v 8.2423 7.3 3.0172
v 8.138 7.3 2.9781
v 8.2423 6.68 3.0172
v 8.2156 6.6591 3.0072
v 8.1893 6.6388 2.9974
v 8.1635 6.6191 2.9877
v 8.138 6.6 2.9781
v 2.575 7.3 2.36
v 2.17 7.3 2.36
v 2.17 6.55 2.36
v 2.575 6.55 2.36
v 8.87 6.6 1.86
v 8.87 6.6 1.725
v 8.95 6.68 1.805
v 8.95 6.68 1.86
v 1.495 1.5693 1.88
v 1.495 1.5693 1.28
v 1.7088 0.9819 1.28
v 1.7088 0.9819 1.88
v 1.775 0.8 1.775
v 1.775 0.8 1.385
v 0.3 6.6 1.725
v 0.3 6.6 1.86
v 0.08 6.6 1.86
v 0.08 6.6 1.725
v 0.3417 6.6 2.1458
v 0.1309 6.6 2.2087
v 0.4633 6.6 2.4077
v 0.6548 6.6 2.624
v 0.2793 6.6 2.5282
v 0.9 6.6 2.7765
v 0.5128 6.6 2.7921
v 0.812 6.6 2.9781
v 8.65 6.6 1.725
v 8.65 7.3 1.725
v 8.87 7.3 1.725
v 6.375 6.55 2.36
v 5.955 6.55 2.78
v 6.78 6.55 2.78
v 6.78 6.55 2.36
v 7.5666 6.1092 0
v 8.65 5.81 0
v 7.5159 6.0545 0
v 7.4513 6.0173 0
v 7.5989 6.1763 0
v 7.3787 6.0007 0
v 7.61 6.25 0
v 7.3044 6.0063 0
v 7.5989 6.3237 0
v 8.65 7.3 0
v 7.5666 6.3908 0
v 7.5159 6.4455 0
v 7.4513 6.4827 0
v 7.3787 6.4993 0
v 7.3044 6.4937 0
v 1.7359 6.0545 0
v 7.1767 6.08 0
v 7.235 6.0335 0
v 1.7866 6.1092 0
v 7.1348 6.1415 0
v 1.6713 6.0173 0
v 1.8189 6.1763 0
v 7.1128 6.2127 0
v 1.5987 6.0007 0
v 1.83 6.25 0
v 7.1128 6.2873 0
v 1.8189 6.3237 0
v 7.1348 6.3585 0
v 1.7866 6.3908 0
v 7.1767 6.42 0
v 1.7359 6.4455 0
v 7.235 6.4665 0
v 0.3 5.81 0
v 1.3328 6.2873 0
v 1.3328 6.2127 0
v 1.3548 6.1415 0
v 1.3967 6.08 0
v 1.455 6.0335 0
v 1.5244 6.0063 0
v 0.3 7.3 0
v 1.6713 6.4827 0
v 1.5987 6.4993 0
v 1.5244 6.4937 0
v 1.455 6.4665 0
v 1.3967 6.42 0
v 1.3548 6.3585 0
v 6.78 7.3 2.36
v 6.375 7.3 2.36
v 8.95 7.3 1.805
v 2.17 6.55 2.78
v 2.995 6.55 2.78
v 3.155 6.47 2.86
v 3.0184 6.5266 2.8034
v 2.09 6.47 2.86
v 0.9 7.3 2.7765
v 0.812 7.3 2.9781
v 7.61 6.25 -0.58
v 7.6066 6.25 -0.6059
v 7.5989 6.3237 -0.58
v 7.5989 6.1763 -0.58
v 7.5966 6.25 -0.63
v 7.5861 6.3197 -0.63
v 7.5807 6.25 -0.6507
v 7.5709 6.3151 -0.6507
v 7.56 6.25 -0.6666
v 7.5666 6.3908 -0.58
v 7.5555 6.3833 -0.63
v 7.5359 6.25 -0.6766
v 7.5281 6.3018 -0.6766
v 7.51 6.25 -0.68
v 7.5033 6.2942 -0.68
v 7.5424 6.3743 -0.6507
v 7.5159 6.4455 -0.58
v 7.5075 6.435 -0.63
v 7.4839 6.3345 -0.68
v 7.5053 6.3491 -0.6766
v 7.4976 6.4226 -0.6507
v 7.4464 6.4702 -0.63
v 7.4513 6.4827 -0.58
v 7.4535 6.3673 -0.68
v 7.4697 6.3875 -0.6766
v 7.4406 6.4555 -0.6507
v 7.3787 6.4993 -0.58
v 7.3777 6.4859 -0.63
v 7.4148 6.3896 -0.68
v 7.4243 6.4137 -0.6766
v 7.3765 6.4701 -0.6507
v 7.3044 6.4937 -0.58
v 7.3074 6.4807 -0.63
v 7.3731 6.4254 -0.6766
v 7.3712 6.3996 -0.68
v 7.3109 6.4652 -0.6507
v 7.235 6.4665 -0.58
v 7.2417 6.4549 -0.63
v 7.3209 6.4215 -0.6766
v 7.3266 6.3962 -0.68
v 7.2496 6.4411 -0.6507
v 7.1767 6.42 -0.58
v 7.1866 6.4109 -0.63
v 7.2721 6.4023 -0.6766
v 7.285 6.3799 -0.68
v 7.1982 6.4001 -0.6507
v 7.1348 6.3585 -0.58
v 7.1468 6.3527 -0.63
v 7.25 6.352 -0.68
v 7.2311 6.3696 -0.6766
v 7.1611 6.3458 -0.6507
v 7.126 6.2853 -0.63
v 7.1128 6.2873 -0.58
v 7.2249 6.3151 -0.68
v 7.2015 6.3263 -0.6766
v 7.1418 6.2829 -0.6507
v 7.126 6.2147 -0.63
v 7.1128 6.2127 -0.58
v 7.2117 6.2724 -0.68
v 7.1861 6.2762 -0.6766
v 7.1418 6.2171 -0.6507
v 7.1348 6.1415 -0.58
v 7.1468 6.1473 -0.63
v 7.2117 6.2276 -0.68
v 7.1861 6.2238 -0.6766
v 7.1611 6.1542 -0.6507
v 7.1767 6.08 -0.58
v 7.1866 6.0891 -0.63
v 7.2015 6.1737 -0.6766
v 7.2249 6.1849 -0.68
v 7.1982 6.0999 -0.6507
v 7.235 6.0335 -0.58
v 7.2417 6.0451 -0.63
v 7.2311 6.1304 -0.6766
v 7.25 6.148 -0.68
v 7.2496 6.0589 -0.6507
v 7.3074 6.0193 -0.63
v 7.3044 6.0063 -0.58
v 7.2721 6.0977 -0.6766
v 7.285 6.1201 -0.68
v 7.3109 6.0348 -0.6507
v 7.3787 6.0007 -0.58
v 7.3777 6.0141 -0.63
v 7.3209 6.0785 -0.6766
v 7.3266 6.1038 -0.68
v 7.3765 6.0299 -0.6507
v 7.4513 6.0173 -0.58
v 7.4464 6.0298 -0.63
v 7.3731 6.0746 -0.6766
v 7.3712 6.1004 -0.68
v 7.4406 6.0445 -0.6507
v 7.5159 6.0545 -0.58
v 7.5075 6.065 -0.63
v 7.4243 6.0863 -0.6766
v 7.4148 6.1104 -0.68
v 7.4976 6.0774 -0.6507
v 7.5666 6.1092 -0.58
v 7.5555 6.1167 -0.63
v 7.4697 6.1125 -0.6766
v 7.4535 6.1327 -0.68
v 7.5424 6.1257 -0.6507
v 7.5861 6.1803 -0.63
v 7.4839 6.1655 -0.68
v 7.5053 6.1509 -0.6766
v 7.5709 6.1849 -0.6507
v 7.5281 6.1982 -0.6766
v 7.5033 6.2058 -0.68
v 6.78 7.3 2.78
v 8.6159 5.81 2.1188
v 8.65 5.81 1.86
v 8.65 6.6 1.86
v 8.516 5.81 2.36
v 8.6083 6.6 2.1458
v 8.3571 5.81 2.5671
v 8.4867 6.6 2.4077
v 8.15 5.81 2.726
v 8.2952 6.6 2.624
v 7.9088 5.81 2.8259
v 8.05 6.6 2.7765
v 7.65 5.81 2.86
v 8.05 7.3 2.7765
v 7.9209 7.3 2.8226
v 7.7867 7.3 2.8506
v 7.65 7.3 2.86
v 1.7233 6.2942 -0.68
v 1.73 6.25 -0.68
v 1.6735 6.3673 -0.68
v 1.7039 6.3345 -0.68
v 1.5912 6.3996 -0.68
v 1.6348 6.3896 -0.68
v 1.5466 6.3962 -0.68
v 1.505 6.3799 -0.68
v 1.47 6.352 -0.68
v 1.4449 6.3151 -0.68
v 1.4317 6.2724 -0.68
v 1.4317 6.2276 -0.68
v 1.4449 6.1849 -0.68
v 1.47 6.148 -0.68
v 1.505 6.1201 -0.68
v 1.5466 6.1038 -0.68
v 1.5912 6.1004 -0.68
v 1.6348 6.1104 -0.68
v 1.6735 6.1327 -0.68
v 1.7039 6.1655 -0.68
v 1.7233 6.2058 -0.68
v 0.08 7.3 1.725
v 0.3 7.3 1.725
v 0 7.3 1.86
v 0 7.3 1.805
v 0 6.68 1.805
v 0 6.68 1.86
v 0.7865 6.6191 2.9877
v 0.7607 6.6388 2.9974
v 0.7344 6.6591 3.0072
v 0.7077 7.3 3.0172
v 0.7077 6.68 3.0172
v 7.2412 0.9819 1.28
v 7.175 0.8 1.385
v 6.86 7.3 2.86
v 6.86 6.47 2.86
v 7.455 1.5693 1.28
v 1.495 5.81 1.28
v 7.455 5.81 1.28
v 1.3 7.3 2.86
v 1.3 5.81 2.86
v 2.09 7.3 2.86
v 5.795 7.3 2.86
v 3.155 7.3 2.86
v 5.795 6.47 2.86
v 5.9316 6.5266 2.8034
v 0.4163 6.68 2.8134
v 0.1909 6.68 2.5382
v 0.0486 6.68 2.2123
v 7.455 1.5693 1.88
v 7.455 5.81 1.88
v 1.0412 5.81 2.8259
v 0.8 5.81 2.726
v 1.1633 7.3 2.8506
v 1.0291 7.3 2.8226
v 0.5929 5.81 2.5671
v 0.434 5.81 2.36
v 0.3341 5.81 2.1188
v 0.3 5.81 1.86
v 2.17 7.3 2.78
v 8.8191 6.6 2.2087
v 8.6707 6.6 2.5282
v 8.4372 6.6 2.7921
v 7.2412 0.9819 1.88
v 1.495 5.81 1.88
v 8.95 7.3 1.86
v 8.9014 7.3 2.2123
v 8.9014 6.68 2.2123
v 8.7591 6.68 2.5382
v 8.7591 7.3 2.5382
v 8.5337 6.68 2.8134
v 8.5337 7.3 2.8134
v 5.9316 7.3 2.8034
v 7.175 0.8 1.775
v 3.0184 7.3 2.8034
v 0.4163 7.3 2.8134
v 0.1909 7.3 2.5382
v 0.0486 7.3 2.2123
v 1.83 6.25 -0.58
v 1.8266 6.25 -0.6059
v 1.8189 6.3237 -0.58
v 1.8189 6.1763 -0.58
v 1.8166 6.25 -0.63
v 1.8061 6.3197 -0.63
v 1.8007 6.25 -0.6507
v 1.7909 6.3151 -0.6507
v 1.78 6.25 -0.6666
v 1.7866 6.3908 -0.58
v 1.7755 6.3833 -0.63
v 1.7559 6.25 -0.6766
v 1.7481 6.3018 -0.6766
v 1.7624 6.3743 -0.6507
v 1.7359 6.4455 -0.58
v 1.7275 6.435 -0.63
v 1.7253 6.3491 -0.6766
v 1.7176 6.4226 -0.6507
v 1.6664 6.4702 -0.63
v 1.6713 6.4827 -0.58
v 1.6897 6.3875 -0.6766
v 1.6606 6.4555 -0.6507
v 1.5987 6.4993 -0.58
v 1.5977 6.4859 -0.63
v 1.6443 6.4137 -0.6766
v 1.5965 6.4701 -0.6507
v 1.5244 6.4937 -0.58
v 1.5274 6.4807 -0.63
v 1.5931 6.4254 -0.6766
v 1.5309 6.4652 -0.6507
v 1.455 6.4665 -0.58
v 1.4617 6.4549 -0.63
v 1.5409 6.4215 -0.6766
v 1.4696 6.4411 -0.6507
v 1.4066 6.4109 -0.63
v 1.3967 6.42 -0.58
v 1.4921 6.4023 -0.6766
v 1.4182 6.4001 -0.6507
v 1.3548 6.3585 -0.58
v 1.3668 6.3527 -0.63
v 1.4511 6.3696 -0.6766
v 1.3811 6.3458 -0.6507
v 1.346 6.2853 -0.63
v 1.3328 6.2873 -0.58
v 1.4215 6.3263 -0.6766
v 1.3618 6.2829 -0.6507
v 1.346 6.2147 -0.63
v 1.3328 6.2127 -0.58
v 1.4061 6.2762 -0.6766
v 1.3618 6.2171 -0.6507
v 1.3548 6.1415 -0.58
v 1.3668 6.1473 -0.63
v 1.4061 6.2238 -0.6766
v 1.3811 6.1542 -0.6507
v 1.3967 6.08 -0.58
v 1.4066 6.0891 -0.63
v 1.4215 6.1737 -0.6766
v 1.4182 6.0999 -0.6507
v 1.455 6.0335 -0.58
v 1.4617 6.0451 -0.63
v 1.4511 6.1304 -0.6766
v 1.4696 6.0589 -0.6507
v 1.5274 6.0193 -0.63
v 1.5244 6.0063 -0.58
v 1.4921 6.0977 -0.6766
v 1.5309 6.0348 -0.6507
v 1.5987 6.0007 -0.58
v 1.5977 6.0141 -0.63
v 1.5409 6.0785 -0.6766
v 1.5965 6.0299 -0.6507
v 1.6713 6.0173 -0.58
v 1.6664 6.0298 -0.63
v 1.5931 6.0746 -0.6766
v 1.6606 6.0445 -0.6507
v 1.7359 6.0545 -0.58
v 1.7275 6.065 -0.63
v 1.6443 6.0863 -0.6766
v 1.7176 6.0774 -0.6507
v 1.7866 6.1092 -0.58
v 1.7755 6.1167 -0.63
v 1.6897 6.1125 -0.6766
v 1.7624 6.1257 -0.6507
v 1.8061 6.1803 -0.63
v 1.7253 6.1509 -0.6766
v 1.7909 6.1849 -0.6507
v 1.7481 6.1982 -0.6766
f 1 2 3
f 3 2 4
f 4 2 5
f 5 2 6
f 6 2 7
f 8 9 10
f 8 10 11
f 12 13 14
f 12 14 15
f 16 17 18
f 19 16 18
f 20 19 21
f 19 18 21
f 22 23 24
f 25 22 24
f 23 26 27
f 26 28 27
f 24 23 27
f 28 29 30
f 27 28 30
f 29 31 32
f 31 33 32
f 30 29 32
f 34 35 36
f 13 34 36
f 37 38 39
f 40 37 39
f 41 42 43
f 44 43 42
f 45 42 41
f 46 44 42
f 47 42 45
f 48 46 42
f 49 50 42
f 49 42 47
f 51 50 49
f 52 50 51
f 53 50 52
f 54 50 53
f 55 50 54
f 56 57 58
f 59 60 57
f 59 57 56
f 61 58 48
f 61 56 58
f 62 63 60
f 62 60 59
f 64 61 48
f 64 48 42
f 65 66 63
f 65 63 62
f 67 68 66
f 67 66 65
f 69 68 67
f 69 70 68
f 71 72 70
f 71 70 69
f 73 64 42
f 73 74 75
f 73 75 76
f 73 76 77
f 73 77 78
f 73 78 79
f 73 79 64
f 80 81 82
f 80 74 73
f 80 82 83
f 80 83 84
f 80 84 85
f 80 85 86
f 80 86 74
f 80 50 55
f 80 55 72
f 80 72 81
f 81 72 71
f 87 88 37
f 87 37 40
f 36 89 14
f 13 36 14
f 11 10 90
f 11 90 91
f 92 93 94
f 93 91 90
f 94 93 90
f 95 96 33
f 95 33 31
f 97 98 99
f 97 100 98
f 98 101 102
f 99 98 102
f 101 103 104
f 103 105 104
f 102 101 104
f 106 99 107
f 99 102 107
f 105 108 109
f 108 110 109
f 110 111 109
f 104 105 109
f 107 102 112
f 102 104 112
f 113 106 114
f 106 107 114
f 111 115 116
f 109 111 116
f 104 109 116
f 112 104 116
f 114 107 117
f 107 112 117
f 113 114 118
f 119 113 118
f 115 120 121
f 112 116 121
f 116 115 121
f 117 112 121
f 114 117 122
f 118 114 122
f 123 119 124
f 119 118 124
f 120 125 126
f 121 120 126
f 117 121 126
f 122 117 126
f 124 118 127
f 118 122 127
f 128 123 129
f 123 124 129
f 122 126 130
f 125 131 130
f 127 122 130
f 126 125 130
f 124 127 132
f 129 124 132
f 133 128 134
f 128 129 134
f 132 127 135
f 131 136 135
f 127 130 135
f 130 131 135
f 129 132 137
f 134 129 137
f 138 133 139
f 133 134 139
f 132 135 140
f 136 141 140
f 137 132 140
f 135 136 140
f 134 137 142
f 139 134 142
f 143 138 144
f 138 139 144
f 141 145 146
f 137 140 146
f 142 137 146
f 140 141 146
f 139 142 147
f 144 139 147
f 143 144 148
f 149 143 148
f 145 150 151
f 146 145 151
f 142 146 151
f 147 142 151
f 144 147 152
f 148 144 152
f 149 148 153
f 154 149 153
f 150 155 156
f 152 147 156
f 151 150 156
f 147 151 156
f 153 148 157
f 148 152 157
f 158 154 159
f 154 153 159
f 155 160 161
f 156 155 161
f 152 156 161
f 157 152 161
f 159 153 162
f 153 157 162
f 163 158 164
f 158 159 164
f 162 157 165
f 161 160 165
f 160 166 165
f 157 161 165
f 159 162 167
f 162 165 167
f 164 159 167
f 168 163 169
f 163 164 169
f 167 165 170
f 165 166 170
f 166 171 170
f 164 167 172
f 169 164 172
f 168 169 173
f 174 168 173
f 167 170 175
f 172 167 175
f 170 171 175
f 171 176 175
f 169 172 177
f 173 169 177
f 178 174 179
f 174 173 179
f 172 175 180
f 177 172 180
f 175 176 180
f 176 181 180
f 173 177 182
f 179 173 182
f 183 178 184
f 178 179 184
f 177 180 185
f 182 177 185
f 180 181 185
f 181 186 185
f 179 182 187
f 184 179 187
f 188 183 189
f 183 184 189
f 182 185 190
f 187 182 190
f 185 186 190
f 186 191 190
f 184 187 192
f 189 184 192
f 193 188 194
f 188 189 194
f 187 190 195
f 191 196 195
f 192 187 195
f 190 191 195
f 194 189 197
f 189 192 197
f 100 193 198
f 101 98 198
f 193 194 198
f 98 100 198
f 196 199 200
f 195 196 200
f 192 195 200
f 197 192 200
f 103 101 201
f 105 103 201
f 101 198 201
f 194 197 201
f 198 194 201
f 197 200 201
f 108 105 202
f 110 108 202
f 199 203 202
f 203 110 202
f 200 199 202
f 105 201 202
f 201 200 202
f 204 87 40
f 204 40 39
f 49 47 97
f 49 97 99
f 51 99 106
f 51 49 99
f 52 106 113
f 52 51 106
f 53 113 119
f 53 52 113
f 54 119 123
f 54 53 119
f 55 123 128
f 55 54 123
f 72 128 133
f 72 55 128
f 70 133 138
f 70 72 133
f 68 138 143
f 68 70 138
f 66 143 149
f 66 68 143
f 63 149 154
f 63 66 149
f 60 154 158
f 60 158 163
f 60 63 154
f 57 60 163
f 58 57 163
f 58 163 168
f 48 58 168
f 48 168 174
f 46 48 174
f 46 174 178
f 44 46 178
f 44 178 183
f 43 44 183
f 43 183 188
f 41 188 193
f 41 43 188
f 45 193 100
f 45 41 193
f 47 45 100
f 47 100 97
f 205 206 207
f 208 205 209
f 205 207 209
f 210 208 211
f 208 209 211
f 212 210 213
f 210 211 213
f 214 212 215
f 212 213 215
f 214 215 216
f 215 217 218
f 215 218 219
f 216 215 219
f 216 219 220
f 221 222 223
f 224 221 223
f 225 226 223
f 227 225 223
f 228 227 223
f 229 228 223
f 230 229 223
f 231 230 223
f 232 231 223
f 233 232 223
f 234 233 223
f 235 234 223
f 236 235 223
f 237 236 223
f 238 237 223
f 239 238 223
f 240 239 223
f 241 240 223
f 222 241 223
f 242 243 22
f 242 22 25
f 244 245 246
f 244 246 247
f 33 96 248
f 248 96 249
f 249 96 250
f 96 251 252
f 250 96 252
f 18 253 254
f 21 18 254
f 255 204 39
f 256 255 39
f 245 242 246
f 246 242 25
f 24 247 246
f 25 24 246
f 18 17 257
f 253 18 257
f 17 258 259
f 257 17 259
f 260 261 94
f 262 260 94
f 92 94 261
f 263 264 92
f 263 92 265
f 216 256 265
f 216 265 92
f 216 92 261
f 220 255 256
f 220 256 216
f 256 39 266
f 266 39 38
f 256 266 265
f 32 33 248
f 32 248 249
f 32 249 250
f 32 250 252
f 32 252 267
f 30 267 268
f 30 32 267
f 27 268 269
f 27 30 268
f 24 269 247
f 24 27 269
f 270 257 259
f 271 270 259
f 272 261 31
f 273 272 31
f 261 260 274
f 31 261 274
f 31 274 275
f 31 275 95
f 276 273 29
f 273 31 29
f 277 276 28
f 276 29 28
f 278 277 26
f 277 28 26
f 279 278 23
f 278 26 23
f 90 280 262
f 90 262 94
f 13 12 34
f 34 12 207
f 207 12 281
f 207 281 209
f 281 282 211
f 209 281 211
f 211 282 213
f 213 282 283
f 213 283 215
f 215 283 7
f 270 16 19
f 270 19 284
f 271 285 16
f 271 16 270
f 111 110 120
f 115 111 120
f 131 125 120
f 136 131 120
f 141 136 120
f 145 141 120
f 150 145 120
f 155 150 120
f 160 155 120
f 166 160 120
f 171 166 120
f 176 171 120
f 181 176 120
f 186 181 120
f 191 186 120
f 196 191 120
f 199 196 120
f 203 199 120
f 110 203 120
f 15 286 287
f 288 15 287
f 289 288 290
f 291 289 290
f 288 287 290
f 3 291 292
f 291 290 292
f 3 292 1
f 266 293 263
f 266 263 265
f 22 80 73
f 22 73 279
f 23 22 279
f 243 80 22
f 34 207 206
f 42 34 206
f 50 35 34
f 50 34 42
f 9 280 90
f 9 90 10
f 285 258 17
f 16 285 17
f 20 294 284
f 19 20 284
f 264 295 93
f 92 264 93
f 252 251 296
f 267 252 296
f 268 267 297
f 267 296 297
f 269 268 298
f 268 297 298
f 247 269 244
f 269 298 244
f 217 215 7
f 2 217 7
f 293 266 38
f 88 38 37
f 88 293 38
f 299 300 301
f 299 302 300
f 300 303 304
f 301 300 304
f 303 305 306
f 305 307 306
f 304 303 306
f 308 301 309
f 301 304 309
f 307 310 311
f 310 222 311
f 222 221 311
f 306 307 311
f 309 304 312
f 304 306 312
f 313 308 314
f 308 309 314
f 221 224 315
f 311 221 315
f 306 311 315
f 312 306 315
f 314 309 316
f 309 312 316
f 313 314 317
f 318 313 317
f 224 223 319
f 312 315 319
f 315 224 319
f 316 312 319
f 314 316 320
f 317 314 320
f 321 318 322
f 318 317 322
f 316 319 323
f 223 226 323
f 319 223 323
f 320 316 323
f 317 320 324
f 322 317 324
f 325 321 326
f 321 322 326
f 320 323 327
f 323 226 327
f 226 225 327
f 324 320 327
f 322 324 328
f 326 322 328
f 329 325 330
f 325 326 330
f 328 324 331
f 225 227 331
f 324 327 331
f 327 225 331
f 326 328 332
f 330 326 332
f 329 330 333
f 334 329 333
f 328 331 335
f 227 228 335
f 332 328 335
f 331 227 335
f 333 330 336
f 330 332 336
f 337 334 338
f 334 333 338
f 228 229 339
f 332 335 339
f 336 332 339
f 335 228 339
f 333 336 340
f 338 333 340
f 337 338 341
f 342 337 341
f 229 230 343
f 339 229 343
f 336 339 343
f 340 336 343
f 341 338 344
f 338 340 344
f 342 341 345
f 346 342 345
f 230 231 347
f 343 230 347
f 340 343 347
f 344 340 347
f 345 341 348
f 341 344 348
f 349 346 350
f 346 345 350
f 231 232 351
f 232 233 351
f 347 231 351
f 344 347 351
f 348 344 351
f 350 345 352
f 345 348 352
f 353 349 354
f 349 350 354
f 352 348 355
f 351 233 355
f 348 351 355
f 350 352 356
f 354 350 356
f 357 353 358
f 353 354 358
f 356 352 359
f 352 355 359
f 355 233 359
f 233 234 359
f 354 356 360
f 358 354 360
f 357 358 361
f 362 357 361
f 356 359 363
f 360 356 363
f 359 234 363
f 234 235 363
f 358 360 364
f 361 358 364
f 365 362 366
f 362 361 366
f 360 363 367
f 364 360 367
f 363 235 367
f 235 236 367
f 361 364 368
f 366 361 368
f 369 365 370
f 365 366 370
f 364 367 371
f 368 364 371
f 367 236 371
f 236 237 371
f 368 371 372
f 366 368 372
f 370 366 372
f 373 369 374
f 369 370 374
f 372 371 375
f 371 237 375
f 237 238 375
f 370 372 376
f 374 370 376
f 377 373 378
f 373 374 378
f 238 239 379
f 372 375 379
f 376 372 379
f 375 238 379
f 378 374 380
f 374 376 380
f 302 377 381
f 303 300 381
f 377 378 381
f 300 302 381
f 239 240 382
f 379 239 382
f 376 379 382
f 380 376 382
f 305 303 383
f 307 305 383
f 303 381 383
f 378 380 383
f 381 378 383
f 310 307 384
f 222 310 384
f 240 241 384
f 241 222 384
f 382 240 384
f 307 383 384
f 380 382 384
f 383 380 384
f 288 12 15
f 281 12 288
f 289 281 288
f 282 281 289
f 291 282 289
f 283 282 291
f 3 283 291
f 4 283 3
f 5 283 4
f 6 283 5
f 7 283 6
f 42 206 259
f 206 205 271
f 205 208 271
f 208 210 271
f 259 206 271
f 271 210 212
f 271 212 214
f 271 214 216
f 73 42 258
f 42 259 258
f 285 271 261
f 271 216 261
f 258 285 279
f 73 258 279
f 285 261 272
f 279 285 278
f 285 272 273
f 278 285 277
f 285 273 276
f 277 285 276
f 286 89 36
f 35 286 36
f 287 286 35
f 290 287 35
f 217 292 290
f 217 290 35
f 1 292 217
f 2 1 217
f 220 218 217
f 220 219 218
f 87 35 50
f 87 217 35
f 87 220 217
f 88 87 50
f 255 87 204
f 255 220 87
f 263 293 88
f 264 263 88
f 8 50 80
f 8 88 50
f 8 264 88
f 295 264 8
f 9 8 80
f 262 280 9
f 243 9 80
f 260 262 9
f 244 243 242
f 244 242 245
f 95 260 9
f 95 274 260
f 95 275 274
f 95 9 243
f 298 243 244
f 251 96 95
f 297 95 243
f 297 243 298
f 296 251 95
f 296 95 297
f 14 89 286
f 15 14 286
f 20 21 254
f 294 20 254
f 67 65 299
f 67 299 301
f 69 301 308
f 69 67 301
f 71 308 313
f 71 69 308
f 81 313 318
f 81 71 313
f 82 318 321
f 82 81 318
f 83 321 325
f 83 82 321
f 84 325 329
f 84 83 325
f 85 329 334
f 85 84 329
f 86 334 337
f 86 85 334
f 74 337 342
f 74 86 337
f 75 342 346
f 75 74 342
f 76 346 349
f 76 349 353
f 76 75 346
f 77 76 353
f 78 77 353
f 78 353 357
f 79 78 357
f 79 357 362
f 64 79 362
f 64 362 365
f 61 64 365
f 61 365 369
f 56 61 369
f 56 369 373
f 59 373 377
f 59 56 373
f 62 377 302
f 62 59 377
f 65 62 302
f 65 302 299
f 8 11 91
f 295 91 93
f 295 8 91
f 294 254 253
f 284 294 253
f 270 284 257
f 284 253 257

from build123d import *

# Parameters (mm, degrees)
PAD003_DEPTH    = 1.49
PAD004_DEPTH    = 0.7
POCKET003_DEPTH = 0.75
CHAMFER_SIZE    = 0.08
PAD006_DEPTH    = 0.6
POCKET004_DEPTH = 7.456
SKETCH014_R     = 0.25
PAD007_DEPTH    = 0.68
FILLET002_R     = 0.1


with BuildPart() as part:
    # Sketch006 → Pad003 (new body)
    with BuildSketch(Plane.XZ.offset(-7.3)):
        with BuildLine():
            Line((0.3, 0), (0.3, 1.86))
            ThreePointArc((1.3, 2.86), (0.592893, 2.567107), (0.3, 1.86))
            Line((1.3, 2.86), (7.65, 2.86))
            ThreePointArc((8.65, 1.86), (8.357107, 2.567107), (7.65, 2.86))
            Line((8.65, 1.86), (8.65, 0))
            Line((8.65, 0), (0.3, 0))
        make_face()
    extrude(amount=PAD003_DEPTH)

    # Sketch008 → Pad004 (join)
    with BuildSketch(Plane.XZ.offset(-7.3)):
        with BuildLine():
            Line((0.78, 3.05147), (0.9, 2.776515))
            Line((0.9, 1.725), (0.9, 2.776515))
            Line((0.9, 1.725), (0, 1.725))
            Line((0, 1.725), (0, 1.86))
            ThreePointArc((0.78, 3.05147), (0.212342, 2.572039), (0, 1.86))
        make_face()
        with BuildLine():
            Line((8.05, 2.776515), (8.17, 3.05147))
            ThreePointArc((8.95, 1.86), (8.737658, 2.572039), (8.17, 3.05147))
            Line((8.95, 1.725), (8.95, 1.86))
            Line((8.05, 1.725), (8.95, 1.725))
            Line((8.05, 2.776515), (8.05, 1.725))
        make_face()
    extrude(amount=PAD004_DEPTH)

    # Sketch009 → Pocket003 (cut)
    with BuildSketch(Plane.XZ.offset(-7.3)):
        Polygon((2.17, 2.86), (2.17, 2.36), (2.575, 2.36), (3.075, 2.86), align=None)
        Polygon((5.875, 2.86), (6.375, 2.36), (6.78, 2.36), (6.78, 2.86), align=None)
    extrude(amount=POCKET003_DEPTH, mode=Mode.SUBTRACT)

    # Chamfer
    chamfer_edges = [part.edges().sort_by_distance(p)[0] for p in [
        (8.95, 6.6, 1.7925),
        (8.737658, 6.6, 2.572039),
        (8.17, 6.95, 3.05147),
        (6.78, 6.925, 2.86),
        (6.3275, 6.55, 2.86),
        (5.875, 6.925, 2.86),
        (3.075, 6.925, 2.86),
        (2.6225, 6.55, 2.86),
        (2.17, 6.925, 2.86),
        (0.78, 6.95, 3.05147),
        (0.212342, 6.6, 2.572039),
        (0, 6.6, 1.7925),
        (8.95, 6.95, 1.725),
        (0, 6.95, 1.725),
    ]]
    chamfer(chamfer_edges, length=CHAMFER_SIZE)

    # Sketch012 → Pad006 (join)
    with BuildSketch(Plane.XY.offset(1.28)):
        Polygon((1.495, 5.81), (1.495, 1.569294), (1.775, 0.8), (7.175, 0.8), (7.455, 1.569294), (7.455, 5.81), align=None)
    extrude(amount=PAD006_DEPTH)

    # Sketch013 → Pocket004 (cut, through all)
    with BuildSketch(Plane(origin=(1.495, 0.8, 1.88), x_dir=(0, 1, 0), z_dir=(1, 0, 0))):
        Polygon((0, -0.105), (0.181865, 0), (0, 0), align=None)
        Polygon((0, -0.6), (0.181865, -0.6), (0, -0.495), align=None)
    extrude(amount=POCKET004_DEPTH, mode=Mode.SUBTRACT)

    # Sketch014 → Pad007 (join)
    with BuildSketch(Plane.XY):
        with Locations((1.58, 6.25)):
            Circle(SKETCH014_R)
        with Locations((7.36, 6.25)):
            Circle(SKETCH014_R)
    extrude(amount=-PAD007_DEPTH)

    # Fillet002
    fillet002_edges = [part.edges().sort_by_distance(p)[0] for p in [
        (7.11, 6.25, -0.68),
        (1.33, 6.25, -0.68),
    ]]
    fillet(fillet002_edges, radius=FILLET002_R)


solid = part.part
